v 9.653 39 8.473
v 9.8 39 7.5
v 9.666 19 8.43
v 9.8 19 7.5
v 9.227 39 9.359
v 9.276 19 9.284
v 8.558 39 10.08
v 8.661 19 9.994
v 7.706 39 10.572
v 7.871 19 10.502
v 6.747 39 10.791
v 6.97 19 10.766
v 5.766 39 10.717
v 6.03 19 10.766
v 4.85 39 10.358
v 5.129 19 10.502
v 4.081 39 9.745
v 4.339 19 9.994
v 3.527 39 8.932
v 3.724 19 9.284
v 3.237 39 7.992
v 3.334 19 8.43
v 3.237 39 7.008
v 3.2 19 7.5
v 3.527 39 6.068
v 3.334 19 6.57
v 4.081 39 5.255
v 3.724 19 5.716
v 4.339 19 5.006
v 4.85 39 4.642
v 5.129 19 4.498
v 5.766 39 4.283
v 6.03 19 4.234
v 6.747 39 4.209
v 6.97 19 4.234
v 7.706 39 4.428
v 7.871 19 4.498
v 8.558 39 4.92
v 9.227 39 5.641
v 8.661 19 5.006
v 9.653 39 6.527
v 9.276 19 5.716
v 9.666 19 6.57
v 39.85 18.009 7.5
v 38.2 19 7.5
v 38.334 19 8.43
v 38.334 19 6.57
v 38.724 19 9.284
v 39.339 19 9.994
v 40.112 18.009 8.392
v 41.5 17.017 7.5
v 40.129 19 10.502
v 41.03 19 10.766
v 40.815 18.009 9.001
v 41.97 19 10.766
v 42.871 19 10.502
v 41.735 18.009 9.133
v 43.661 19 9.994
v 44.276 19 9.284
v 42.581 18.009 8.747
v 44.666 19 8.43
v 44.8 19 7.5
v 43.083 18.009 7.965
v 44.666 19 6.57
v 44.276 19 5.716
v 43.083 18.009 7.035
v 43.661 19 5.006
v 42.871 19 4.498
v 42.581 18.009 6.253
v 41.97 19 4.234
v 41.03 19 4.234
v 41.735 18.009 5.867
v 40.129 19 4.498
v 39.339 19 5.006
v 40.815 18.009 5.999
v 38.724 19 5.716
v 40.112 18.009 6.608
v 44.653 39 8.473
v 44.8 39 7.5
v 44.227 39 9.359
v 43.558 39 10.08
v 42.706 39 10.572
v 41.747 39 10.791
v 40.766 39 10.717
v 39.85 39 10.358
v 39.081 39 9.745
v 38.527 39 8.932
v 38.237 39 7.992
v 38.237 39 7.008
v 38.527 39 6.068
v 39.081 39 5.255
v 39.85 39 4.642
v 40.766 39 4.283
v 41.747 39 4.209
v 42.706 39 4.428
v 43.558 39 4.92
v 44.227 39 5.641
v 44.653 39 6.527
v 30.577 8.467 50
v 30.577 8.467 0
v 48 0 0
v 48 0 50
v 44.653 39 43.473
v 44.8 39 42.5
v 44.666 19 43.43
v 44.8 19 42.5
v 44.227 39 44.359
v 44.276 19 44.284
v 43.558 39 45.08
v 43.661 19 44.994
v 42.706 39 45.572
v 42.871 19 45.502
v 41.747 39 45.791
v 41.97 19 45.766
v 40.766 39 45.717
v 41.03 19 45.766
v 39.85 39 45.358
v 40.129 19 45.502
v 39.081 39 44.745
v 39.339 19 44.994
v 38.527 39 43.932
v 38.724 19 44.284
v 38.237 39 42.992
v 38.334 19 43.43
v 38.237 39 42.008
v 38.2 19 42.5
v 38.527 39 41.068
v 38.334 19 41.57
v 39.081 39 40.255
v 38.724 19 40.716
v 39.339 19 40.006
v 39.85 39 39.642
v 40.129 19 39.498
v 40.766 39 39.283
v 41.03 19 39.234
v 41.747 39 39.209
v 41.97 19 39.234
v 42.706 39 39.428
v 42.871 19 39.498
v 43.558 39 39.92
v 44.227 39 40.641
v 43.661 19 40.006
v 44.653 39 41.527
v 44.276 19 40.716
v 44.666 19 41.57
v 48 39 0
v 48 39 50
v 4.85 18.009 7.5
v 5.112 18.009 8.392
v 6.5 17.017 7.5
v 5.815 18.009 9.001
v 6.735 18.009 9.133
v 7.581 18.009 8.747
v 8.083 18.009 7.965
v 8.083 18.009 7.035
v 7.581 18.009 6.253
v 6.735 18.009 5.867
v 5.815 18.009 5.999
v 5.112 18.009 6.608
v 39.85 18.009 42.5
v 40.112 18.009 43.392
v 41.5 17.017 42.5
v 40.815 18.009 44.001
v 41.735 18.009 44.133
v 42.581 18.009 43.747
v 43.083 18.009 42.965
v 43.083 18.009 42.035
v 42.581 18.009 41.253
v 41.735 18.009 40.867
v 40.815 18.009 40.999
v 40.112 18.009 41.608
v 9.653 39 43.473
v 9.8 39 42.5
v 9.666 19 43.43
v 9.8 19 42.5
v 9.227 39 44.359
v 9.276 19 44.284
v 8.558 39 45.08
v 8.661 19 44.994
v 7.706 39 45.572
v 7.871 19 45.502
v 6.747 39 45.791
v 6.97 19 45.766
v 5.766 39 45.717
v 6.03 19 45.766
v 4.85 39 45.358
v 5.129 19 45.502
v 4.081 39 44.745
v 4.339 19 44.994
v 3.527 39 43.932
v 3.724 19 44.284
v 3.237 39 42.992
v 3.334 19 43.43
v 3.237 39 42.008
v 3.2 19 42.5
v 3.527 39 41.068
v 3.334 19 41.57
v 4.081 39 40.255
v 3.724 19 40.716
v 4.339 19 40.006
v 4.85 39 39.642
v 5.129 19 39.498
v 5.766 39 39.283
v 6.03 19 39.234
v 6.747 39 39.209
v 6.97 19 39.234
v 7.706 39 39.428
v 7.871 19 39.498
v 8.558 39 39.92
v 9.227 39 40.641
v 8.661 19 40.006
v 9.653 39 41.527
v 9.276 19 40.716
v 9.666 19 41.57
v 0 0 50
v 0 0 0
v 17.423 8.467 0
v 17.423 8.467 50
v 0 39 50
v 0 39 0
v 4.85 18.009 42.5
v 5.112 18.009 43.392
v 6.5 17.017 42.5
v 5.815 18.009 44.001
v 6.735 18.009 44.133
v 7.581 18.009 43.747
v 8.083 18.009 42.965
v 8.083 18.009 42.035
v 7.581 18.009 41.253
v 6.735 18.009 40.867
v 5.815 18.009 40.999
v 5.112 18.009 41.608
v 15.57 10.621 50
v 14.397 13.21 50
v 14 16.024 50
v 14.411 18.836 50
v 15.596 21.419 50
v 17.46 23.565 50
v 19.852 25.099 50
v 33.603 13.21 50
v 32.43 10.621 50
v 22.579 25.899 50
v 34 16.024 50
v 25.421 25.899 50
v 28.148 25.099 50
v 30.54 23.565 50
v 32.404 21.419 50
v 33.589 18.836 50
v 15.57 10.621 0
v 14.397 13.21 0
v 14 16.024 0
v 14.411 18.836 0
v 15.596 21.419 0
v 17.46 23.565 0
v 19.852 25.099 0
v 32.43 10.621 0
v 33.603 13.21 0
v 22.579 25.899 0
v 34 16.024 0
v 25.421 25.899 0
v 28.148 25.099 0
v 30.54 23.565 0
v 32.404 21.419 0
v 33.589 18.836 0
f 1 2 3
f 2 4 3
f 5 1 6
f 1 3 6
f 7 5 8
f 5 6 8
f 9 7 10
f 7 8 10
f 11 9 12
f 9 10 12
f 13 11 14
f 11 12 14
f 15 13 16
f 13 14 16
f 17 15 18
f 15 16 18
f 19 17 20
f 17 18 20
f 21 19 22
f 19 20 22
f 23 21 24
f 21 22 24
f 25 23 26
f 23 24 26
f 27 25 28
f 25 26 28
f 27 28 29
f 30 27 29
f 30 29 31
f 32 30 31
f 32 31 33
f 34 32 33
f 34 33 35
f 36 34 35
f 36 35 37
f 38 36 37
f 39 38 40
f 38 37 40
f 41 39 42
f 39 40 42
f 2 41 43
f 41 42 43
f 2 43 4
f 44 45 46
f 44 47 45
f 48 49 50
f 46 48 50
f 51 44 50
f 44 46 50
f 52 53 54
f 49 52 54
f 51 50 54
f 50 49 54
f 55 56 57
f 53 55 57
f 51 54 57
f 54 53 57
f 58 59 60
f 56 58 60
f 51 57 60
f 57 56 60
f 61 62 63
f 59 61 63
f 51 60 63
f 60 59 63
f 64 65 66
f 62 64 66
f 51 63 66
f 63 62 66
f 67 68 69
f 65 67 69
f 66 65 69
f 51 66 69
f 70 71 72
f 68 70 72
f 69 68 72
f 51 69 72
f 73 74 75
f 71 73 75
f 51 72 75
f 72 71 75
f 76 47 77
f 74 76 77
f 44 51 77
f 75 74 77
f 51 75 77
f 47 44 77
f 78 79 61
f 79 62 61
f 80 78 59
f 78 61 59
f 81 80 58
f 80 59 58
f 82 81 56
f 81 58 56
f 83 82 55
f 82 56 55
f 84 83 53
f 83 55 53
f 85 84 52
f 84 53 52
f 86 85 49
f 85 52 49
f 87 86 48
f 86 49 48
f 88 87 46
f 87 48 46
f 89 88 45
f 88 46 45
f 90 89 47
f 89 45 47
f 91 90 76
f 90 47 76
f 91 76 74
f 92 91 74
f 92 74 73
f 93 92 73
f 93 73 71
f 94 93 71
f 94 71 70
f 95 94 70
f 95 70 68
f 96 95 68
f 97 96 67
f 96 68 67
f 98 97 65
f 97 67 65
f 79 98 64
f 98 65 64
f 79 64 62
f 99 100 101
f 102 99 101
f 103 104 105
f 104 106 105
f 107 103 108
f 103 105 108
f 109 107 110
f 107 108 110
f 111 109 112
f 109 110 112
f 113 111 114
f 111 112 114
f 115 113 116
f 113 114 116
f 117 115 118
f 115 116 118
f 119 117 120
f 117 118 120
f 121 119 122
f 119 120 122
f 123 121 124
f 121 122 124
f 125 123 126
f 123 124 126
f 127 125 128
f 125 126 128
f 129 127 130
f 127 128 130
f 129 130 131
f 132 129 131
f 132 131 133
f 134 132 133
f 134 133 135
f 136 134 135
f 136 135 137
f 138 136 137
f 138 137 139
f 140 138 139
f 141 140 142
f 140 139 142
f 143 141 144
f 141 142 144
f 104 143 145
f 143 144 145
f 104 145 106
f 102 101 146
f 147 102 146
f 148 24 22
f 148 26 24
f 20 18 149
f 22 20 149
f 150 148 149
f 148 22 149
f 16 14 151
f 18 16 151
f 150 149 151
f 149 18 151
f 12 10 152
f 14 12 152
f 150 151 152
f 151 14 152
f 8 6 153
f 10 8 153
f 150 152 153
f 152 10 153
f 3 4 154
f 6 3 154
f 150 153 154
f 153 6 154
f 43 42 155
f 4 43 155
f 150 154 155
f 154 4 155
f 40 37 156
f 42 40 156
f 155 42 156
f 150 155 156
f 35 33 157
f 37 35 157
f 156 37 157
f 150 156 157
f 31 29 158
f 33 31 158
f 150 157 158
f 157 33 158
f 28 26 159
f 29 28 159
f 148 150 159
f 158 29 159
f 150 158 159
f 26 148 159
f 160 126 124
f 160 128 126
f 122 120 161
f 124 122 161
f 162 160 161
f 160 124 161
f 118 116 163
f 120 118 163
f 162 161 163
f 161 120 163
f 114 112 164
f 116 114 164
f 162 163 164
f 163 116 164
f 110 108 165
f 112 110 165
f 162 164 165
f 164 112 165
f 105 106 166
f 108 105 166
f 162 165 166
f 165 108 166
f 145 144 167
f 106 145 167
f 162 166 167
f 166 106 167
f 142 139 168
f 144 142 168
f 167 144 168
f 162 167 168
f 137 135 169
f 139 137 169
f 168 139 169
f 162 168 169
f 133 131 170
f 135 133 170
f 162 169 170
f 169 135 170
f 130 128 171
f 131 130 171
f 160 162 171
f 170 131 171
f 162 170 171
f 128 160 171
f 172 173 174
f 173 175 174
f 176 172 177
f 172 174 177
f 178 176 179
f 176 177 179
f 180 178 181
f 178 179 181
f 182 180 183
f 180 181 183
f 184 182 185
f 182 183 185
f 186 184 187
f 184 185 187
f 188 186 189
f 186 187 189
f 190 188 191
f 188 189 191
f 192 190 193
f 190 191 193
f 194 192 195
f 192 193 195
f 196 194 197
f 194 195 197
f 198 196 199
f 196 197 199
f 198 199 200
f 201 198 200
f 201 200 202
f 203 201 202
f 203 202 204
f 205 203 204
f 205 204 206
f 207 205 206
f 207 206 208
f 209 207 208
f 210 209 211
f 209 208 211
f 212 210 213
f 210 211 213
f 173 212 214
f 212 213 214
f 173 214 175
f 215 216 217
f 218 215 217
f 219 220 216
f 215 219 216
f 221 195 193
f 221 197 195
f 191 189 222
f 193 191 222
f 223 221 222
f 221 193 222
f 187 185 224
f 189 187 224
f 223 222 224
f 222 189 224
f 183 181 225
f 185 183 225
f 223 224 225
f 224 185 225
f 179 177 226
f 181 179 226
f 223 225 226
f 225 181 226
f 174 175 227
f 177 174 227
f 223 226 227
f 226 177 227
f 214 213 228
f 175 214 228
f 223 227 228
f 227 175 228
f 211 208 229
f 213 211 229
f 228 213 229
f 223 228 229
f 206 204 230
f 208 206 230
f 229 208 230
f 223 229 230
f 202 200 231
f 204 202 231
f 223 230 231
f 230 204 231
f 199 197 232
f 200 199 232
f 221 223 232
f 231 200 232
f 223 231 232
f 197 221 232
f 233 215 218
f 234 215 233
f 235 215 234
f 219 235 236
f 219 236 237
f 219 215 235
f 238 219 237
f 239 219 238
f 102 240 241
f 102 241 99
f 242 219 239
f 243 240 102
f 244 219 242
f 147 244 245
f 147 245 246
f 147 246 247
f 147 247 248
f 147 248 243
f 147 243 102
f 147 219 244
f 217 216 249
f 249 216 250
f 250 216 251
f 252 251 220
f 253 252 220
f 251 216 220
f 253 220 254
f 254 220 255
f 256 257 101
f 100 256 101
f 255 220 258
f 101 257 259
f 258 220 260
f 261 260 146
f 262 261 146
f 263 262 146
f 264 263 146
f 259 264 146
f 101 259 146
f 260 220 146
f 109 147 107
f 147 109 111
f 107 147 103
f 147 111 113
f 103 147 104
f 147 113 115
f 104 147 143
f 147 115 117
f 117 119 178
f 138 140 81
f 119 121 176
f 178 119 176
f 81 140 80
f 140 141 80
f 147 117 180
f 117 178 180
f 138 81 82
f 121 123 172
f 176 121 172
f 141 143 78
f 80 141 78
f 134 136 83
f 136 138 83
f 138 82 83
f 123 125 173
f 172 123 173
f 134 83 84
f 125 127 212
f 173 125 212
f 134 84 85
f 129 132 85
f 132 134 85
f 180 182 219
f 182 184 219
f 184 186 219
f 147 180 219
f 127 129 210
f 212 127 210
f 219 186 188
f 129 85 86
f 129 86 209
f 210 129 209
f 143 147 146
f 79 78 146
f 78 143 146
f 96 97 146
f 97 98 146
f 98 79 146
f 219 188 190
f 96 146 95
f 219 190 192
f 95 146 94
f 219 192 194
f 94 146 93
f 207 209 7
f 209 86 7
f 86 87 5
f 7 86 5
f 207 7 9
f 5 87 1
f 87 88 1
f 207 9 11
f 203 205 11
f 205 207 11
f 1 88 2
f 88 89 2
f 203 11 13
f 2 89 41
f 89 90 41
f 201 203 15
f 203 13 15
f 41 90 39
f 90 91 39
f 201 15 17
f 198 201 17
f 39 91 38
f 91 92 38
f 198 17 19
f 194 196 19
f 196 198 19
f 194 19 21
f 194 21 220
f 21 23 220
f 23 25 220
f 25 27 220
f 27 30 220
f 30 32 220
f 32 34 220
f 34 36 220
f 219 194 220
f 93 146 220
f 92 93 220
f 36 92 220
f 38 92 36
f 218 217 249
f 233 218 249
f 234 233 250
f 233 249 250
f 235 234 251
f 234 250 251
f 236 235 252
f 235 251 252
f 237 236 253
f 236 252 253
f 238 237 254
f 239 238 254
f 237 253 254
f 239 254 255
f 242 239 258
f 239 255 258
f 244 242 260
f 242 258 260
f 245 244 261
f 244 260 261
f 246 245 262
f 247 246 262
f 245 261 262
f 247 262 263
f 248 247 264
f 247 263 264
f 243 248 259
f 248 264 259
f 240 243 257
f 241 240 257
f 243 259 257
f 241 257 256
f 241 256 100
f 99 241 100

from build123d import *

# Parameters (mm, degrees)
F1_DEPTH = 50
F3_D     = 6.6
F3_DEPTH = 20
F3_TIP   = 1.9828400428


# Not quite as in the source:
# - a feature names something its author has since deleted; it is built from what else it names


with BuildPart() as f1:
    # F0 (on Top) → F1 (new body)
    with BuildSketch(Plane.XY):
        with BuildLine():
            Line((0, 39), (0, 0))
            Line((0, 0), (17.4234656395, 8.4667937898))
            ThreePointArc((17.4234656395, 8.4667937898), (24, 26), (30.5765343605, 8.4667937898))
            Line((30.5765343605, 8.4667937898), (48, 0))
            Line((48, 0), (48, 39))
            Line((48, 39), (0, 39))
        make_face()
    extrude(amount=F1_DEPTH)

    # F3
    with Locations(Plane(origin=(0, 39, 0), x_dir=(-1, 0, 0), z_dir=(0, 1, 0))):
        with Locations((-41.5, 42.5), (-41.5, 7.5), (-6.5, 7.5), (-6.5, 42.5)):
            Hole(F3_D / 2, depth=F3_DEPTH)
            with Locations((0, 0, -(F3_DEPTH + F3_TIP / 2))):  # 118° drill point
                Cone(0, F3_D / 2, F3_TIP, mode=Mode.SUBTRACT)


solid = f1.part
